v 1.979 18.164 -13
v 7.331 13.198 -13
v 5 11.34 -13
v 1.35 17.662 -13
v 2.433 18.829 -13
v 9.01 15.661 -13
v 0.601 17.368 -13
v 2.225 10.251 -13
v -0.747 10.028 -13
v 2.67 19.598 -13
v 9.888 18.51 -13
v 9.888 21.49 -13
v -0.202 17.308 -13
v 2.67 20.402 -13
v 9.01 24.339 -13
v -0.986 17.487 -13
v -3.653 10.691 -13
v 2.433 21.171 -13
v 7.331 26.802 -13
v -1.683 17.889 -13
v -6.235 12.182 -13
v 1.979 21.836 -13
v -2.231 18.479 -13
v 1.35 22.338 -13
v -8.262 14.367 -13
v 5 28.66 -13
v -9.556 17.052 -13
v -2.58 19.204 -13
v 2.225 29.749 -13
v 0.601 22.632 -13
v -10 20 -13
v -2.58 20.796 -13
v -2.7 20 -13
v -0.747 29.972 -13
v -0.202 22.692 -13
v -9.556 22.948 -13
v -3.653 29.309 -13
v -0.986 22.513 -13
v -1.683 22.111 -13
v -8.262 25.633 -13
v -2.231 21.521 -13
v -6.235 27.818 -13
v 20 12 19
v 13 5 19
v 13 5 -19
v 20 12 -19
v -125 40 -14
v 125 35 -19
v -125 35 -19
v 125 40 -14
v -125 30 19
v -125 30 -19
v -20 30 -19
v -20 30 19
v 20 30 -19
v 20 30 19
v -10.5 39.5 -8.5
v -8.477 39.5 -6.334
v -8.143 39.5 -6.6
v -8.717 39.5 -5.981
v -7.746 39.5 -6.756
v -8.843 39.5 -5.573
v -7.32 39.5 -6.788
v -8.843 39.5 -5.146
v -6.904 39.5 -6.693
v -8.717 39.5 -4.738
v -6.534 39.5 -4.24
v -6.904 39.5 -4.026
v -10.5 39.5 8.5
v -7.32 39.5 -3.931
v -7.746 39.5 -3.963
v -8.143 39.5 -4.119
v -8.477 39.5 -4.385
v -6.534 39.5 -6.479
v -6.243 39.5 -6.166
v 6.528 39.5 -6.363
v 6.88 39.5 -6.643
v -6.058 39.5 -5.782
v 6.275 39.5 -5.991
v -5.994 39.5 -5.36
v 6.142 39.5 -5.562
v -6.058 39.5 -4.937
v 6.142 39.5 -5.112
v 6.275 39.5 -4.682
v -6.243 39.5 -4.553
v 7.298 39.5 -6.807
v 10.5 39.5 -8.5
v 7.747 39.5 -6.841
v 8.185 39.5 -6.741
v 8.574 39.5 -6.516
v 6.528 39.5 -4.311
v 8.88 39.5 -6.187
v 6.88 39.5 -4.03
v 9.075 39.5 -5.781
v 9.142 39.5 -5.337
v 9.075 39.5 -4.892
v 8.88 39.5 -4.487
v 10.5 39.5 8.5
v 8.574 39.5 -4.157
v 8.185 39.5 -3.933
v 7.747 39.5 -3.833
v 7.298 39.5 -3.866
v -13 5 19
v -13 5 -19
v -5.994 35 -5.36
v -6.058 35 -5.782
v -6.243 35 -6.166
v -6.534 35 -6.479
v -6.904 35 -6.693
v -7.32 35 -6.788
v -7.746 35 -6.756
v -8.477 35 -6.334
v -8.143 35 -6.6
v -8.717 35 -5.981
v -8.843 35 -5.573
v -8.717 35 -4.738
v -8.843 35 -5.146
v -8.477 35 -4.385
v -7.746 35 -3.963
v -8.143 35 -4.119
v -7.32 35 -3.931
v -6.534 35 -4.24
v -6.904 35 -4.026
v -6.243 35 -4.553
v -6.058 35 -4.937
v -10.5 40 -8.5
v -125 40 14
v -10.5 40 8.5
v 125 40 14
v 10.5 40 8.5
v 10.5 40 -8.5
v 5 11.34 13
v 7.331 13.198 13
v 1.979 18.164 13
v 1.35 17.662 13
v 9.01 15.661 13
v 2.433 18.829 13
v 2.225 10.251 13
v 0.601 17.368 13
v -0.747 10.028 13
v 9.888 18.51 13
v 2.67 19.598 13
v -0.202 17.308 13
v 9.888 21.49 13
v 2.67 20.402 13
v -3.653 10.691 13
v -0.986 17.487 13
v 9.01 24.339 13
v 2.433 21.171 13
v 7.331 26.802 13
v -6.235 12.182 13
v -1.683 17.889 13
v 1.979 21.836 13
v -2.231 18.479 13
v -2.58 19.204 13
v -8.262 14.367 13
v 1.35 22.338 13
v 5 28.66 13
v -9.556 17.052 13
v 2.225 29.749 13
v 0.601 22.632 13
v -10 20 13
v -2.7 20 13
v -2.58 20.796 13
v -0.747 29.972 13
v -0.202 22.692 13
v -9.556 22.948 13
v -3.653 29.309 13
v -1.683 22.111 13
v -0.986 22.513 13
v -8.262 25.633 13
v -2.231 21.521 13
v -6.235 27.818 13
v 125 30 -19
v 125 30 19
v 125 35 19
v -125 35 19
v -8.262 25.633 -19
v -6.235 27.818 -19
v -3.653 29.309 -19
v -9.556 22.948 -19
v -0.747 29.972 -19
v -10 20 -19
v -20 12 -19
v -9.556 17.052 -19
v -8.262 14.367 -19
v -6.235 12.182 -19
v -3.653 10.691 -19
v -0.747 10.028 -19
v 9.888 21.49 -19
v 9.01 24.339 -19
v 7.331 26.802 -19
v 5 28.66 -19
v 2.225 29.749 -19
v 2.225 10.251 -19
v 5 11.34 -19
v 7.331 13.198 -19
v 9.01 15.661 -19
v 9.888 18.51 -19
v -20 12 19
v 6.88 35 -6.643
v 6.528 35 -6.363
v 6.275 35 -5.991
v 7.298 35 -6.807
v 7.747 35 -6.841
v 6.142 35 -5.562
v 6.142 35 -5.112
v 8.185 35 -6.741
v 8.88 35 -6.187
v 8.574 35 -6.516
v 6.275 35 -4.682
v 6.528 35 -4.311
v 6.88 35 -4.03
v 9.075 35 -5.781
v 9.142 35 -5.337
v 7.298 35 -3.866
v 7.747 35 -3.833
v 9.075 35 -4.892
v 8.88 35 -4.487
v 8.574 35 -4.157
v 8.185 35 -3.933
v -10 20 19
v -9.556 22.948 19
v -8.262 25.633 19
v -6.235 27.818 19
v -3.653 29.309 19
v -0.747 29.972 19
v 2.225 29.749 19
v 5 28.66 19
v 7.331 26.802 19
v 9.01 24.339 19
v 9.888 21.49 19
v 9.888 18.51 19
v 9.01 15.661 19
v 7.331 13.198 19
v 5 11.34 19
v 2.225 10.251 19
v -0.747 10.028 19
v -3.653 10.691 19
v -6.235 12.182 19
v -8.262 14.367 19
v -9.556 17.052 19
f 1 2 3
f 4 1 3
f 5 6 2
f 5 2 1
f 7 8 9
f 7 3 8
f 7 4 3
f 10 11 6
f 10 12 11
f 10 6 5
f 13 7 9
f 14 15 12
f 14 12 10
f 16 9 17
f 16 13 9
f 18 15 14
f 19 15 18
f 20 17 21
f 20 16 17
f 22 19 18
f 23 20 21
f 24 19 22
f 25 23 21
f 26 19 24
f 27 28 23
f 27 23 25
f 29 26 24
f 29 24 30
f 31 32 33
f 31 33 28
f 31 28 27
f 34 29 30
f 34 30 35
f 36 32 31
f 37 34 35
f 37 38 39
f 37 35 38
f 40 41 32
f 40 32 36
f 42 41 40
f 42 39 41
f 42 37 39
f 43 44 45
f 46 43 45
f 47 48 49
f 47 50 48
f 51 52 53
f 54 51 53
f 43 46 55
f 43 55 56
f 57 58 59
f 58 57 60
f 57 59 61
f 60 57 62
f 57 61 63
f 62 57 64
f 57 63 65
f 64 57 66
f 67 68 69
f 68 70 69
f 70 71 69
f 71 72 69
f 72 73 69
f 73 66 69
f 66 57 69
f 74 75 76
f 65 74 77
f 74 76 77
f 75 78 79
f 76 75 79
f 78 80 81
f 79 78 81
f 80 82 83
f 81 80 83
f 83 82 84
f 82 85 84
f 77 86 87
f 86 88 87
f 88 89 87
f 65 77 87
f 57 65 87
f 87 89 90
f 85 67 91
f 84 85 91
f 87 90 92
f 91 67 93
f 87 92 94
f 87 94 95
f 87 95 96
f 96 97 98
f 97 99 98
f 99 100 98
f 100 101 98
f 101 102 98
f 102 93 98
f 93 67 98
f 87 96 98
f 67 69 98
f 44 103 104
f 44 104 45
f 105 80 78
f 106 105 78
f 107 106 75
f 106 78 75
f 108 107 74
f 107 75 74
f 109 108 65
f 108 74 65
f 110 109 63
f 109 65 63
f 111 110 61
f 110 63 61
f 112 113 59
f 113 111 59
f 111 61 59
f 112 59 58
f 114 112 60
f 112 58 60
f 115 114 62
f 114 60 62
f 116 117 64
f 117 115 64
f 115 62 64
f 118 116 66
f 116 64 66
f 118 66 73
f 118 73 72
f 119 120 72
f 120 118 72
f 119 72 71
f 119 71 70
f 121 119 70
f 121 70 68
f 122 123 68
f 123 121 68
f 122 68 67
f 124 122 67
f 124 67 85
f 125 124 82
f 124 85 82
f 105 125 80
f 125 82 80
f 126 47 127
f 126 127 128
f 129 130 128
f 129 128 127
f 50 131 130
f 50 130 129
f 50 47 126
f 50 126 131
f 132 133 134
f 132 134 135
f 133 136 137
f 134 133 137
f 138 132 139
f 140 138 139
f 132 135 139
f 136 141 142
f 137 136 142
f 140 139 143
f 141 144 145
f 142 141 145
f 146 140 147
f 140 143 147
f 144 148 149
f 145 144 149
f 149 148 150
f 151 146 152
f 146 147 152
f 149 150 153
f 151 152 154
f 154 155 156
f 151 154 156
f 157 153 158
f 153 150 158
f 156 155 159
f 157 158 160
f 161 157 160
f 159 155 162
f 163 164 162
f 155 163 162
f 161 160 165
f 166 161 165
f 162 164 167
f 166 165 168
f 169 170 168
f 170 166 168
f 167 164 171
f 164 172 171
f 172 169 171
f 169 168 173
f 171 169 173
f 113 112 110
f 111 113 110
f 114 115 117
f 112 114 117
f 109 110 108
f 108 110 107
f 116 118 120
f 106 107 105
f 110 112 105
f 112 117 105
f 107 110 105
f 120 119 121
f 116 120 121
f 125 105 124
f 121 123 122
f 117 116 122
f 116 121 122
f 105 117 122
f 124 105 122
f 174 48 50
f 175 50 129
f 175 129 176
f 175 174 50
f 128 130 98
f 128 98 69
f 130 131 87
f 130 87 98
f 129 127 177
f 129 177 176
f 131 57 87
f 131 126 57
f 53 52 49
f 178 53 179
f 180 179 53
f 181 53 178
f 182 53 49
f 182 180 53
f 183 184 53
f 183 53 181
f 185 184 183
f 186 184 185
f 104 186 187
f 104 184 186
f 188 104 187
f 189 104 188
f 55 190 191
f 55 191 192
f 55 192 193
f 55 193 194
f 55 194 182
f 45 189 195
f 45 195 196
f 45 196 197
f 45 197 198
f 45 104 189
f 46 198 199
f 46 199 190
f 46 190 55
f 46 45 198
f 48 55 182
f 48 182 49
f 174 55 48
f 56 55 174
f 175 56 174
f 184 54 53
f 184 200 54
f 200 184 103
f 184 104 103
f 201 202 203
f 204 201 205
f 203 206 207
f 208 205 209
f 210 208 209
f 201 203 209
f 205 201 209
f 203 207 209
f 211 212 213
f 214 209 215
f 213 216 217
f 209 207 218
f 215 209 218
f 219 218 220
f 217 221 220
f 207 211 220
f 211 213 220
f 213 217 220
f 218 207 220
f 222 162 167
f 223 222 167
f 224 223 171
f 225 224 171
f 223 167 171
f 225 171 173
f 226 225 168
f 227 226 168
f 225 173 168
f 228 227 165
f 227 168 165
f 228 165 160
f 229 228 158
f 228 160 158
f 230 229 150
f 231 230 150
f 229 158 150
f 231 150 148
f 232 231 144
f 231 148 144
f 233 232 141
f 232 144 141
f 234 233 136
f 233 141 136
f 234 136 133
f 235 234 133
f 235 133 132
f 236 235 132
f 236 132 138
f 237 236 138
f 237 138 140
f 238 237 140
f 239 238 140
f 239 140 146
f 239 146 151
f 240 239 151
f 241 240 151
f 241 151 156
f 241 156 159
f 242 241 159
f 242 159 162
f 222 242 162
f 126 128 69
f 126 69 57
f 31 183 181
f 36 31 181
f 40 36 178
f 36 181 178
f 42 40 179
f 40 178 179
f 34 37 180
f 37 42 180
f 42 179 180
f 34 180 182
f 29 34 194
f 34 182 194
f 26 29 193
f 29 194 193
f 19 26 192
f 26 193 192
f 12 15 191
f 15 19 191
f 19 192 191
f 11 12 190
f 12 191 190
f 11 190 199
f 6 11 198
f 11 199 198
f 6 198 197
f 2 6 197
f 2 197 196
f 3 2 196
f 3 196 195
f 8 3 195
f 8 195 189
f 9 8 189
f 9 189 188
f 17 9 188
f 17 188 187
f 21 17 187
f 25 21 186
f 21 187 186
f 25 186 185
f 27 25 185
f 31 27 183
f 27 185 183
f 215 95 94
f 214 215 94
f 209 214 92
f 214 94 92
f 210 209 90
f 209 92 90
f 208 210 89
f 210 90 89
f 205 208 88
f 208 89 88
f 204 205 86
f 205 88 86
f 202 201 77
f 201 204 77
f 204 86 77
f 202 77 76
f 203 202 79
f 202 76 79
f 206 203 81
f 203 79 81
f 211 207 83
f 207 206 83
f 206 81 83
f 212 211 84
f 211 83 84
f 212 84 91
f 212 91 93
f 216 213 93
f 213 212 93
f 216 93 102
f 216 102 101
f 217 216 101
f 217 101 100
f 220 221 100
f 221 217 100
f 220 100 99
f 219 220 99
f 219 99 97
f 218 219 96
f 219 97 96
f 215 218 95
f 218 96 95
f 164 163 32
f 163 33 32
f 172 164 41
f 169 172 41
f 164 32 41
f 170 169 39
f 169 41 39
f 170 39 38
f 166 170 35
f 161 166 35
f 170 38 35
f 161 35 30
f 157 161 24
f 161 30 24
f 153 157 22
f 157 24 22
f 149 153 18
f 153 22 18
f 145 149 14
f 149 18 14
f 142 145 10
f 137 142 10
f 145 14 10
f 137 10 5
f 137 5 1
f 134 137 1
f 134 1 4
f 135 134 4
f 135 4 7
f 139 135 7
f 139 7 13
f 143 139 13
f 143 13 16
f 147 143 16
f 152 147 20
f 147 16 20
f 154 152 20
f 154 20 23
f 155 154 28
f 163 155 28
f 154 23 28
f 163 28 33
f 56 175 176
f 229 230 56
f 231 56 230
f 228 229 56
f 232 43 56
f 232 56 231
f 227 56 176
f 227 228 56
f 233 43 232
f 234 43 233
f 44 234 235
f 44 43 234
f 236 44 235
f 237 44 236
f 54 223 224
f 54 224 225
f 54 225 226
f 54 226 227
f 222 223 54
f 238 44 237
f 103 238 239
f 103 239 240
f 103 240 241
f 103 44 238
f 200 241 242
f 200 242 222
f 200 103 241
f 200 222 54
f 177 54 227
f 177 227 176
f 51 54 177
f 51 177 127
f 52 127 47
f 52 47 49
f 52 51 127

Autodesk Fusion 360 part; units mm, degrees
sketch "Sketch1" plane through (0, 0, 0) normal (0, 1, 0) x (1, 0, 0)
  line L0 (20, -19) -> (-20, -19)
  line L1 (-20, -19) -> (-20, 19)
  line L2 (-20, 19) -> (20, 19)
  line L3 (20, 19) -> (20, -19)
  line L4 (20, -19) -> (-20, 19) construction
  line L5 (-20, -19) -> (20, 19) construction
  line L6 (125, -19) -> (-125, -19)
  line L7 (-125, -19) -> (-125, 19)
  line L8 (-125, 19) -> (125, 19)
  line L9 (125, 19) -> (125, -19)
  line L10 (125, -19) -> (-125, 19) construction
  line L11 (-125, -19) -> (125, 19) construction
  dimension "d1" = 40
  dimension "d2" = 38
  dimension "d25" = 250
  dimension "d26" = 38
extrude "Extrude1" add sketch "Sketch1" along normal blind 30 contours L0 L1 L2 L3 L6 L8
sketch "Sketch3" plane through (0, 0, -19) normal (0, 0, -1) x (-1, 0, 0)
  line L0 (-20, 0) -> (20, 0)
  line L1 (20, 0) -> (20, 30)
  line L2 (-20, 30) -> (-20, 0)
  circle A0 centre (0, 20) radius 10
  circle A1 centre (0, 20) radius 2.7
  line L3 (20, 30) -> (-20, 30)
  dimension "d13" = 5.4
extrude "Extrude3" cut sketch "Sketch3" against normal blind 60 contours A1
extrude "Extrude4" cut sketch "Sketch3" against normal blind 6 contours A0
extrude "Extrude5" cut sketch "Sketch3" against normal blind 6 from surface at -32 contours A0
extrude "Extrude6" add sketch "Sketch1" along normal blind 10 from surface at 30
chamfer "Chamfer2" distance 5 angle 45 4 edges at (0, 40, 19) (0, 40, -19) (0, 0, 19) (0, 0, -19)
chamfer "Chamfer3" distance 12 angle 45 2 edges at (20, 0, 0) (-20, 0, 0)
extrude "Extrude7" cut sketch "Sketch1" along normal blind 5 contours L0 L1 L2 L3 L6 L8
sketch "Sketch5" plane through (0, 40, 0) normal (0, -1, 0) x (1, 0, 0)
  line L0 (-9.9736, 7.5643) -> (-9.9736, -7.9957)
  line L1 (-9.9736, -7.9957) -> (10.2882, -7.9957)
  line L2 (10.2882, -7.9957) -> (10.2882, 7.5643)
  line L3 (10.2882, 7.5643) -> (-9.9736, 7.5643)
  circle A0 centre (-8.5238, 6.1446) radius 0.9796
  circle A1 centre (1.4942, 6.1953) radius 0.9537
  circle A2 centre (8.9673, 6.2107) radius 1.0098
  circle A3 centre (-1.0564, 6.2266) radius 0.9892
  circle A4 centre (7.6339, -5.3368) radius 1.5084
  circle A5 centre (-6.0639, 6.1567) radius 0.9903
  circle A6 centre (3.9566, 6.1712) radius 0.9784
  circle A7 centre (6.4638, 6.2006) radius 0.9737
  circle A8 centre (-3.4927, 6.169) radius 0.9564
  circle A9 centre (-7.4269, -5.3596) radius 1.4324
  line L4 (10.5, 8.5) -> (-10.5, 8.5)
  line L5 (-10.5, 8.5) -> (-10.5, -8.5)
  line L6 (-10.5, -8.5) -> (10.5, -8.5)
  line L7 (10.5, -8.5) -> (10.5, 8.5)
  line L8 (10.5, 8.5) -> (-10.5, -8.5) construction
  line L9 (-10.5, 8.5) -> (10.5, -8.5) construction
  line L10 (125, -14) -> (-125, -14)
  line L11 (-125, -14) -> (-125, 14)
  line L12 (-125, 14) -> (125, 14)
  line L13 (125, 14) -> (125, -14)
  dimension "d33" = 21
  dimension "d34" = 17
extrude "Extrude8" cut sketch "Sketch5" along normal blind 5 contours A4 | A9
extrude "Extrude9" cut sketch "Sketch5" along normal blind 0.5 contours L0 L1 L2 L3 | A0 | A1 | A2 | A3 | A5 | A6 | A7 | A8 | L4 L5 L6 L7
